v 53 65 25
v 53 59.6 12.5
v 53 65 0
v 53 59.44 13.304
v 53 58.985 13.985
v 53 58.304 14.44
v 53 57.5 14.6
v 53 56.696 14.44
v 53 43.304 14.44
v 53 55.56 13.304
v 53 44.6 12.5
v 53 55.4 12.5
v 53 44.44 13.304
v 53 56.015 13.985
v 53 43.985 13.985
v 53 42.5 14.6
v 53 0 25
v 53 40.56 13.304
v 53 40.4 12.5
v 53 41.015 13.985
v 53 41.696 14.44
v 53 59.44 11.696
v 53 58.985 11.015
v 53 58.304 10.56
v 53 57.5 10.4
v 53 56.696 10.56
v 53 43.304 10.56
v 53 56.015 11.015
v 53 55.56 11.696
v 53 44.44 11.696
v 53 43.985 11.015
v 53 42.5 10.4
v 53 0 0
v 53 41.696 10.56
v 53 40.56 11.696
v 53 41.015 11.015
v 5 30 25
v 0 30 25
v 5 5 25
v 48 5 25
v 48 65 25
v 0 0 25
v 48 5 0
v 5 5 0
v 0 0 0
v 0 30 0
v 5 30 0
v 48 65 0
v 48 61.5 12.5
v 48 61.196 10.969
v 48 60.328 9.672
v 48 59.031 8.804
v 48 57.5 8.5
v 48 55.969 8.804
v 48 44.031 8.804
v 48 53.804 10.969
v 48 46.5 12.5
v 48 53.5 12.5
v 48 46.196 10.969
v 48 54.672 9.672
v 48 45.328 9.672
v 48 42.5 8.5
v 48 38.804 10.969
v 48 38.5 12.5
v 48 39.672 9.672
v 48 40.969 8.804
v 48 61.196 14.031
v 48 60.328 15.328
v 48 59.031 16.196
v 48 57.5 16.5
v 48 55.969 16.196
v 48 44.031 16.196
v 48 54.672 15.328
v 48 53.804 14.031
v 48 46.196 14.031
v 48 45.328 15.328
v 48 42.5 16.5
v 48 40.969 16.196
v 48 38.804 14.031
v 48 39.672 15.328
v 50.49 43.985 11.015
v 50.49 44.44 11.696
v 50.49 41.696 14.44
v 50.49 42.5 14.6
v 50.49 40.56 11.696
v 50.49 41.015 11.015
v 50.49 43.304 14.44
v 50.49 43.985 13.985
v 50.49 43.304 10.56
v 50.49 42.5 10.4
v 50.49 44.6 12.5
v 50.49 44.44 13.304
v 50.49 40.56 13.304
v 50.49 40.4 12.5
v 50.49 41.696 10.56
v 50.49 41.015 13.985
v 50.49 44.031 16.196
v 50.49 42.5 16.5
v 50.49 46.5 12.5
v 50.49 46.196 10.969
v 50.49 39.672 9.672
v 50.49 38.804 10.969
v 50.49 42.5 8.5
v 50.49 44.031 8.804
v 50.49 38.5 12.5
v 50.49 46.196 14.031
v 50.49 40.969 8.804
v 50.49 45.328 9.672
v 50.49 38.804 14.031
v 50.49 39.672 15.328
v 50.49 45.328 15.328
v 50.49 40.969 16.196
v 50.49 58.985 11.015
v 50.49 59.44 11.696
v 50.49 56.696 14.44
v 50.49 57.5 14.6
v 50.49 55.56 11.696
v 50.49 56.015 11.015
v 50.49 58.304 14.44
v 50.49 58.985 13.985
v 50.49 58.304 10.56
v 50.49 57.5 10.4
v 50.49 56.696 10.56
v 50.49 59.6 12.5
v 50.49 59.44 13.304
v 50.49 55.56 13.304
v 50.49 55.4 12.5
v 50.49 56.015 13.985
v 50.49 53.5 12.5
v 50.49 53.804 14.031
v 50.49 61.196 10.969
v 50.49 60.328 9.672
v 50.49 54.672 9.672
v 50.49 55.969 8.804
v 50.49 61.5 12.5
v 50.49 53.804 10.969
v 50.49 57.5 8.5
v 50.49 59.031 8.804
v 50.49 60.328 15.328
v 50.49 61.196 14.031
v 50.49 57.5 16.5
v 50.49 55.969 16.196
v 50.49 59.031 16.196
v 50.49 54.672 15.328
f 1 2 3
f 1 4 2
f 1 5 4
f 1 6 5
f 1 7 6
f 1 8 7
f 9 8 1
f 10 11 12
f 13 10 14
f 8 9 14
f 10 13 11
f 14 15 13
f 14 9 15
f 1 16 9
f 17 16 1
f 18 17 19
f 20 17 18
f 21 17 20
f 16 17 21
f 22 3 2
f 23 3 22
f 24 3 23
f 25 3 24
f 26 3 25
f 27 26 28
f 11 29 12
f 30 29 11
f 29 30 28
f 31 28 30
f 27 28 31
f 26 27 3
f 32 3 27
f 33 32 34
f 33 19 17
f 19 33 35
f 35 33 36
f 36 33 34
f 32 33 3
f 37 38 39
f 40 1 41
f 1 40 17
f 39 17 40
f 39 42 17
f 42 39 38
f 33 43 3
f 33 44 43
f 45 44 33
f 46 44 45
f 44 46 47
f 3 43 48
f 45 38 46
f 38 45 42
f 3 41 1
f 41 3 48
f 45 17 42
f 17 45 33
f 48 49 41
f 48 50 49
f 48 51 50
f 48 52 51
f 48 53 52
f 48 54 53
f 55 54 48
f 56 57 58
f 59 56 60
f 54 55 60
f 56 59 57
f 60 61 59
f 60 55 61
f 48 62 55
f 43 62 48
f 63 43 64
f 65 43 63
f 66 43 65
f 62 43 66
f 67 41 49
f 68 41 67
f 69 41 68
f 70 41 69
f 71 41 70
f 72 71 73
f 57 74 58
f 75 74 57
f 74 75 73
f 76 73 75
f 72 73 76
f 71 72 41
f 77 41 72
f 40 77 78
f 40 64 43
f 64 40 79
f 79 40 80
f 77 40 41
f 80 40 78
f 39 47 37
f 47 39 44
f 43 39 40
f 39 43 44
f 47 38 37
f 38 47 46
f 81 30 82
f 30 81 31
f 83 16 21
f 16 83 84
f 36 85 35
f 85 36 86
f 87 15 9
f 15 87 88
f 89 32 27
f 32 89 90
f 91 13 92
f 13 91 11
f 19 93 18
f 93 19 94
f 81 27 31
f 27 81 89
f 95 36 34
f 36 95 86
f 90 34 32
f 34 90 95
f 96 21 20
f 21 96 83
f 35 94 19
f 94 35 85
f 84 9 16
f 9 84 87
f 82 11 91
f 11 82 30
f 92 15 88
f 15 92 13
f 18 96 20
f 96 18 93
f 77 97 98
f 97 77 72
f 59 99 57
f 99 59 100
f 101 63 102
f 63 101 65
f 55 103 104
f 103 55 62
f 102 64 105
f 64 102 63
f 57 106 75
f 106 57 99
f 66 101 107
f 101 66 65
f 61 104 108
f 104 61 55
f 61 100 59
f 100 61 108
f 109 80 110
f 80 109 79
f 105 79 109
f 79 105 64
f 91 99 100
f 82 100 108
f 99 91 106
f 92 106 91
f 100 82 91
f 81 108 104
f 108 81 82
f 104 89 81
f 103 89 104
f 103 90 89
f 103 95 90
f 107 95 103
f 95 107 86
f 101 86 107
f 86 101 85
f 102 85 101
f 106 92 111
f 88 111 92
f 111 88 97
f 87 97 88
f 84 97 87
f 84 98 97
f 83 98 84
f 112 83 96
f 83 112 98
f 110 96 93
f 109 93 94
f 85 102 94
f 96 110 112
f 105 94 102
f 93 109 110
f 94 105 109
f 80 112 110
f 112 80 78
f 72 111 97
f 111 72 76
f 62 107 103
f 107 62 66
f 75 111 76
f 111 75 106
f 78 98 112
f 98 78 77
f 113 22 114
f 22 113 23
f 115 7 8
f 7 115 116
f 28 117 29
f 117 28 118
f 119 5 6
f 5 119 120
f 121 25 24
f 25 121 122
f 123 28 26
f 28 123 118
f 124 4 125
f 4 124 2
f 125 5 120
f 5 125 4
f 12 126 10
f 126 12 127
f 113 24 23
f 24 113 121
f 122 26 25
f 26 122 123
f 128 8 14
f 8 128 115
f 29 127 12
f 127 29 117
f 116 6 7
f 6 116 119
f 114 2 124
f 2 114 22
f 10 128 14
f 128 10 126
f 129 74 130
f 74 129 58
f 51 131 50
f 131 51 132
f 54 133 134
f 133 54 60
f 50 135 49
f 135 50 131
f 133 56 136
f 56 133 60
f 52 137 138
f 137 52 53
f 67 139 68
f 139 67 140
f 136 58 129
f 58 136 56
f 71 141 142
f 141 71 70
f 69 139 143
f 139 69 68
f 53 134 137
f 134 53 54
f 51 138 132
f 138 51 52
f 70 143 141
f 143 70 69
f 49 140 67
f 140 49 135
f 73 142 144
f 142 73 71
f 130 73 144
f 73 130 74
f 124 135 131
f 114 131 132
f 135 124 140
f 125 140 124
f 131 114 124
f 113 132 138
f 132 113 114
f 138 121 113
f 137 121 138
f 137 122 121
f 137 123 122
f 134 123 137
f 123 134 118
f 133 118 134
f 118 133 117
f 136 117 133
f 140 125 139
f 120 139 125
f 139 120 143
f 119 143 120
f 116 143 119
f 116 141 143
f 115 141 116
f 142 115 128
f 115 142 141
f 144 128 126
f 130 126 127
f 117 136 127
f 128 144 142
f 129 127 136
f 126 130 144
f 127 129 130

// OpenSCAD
// 4cm breites geländer

breite_gelaender=43;
dicke_halterung=5;
hoehe_halterung=60;
breite_halterung=25;

difference(){
    // haken
    cube([breite_gelaender+2*dicke_halterung, hoehe_halterung+dicke_halterung, breite_halterung]);
    translate([dicke_halterung,dicke_halterung,-0.5])
    cube([breite_gelaender, hoehe_halterung+1, breite_halterung+1]);
    translate([-0.1, 30,-0.5])
    cube([20,hoehe_halterung,breite_halterung+1]);
    
    // schraubloecher
    translate([breite_gelaender+dicke_halterung-0.01, 30+(hoehe_halterung-30)/4 + dicke_halterung, breite_halterung/2])
    rotate([0,90,0])
    cylinder(r=2.1, h=dicke_halterung+1, $fn=16);
    
    translate([breite_gelaender+dicke_halterung-0.01,30+(hoehe_halterung-30)/4 + dicke_halterung,breite_halterung/2])
    rotate([0,90,0])
    cylinder(r=4, h=dicke_halterung/2, $fn=16);;    
    
    // schraubloecher
    translate([breite_gelaender+dicke_halterung-0.01, 30+3*((hoehe_halterung-30)/4) + dicke_halterung, breite_halterung/2])
    rotate([0,90,0])
    cylinder(r=2.1, h=dicke_halterung+1, $fn=16);
    
    translate([breite_gelaender+dicke_halterung-0.01, 30+3*((hoehe_halterung-30)/4) + dicke_halterung, breite_halterung/2])
    rotate([0,90,0])
    cylinder(r=4, h=dicke_halterung/2, $fn=16);
}
